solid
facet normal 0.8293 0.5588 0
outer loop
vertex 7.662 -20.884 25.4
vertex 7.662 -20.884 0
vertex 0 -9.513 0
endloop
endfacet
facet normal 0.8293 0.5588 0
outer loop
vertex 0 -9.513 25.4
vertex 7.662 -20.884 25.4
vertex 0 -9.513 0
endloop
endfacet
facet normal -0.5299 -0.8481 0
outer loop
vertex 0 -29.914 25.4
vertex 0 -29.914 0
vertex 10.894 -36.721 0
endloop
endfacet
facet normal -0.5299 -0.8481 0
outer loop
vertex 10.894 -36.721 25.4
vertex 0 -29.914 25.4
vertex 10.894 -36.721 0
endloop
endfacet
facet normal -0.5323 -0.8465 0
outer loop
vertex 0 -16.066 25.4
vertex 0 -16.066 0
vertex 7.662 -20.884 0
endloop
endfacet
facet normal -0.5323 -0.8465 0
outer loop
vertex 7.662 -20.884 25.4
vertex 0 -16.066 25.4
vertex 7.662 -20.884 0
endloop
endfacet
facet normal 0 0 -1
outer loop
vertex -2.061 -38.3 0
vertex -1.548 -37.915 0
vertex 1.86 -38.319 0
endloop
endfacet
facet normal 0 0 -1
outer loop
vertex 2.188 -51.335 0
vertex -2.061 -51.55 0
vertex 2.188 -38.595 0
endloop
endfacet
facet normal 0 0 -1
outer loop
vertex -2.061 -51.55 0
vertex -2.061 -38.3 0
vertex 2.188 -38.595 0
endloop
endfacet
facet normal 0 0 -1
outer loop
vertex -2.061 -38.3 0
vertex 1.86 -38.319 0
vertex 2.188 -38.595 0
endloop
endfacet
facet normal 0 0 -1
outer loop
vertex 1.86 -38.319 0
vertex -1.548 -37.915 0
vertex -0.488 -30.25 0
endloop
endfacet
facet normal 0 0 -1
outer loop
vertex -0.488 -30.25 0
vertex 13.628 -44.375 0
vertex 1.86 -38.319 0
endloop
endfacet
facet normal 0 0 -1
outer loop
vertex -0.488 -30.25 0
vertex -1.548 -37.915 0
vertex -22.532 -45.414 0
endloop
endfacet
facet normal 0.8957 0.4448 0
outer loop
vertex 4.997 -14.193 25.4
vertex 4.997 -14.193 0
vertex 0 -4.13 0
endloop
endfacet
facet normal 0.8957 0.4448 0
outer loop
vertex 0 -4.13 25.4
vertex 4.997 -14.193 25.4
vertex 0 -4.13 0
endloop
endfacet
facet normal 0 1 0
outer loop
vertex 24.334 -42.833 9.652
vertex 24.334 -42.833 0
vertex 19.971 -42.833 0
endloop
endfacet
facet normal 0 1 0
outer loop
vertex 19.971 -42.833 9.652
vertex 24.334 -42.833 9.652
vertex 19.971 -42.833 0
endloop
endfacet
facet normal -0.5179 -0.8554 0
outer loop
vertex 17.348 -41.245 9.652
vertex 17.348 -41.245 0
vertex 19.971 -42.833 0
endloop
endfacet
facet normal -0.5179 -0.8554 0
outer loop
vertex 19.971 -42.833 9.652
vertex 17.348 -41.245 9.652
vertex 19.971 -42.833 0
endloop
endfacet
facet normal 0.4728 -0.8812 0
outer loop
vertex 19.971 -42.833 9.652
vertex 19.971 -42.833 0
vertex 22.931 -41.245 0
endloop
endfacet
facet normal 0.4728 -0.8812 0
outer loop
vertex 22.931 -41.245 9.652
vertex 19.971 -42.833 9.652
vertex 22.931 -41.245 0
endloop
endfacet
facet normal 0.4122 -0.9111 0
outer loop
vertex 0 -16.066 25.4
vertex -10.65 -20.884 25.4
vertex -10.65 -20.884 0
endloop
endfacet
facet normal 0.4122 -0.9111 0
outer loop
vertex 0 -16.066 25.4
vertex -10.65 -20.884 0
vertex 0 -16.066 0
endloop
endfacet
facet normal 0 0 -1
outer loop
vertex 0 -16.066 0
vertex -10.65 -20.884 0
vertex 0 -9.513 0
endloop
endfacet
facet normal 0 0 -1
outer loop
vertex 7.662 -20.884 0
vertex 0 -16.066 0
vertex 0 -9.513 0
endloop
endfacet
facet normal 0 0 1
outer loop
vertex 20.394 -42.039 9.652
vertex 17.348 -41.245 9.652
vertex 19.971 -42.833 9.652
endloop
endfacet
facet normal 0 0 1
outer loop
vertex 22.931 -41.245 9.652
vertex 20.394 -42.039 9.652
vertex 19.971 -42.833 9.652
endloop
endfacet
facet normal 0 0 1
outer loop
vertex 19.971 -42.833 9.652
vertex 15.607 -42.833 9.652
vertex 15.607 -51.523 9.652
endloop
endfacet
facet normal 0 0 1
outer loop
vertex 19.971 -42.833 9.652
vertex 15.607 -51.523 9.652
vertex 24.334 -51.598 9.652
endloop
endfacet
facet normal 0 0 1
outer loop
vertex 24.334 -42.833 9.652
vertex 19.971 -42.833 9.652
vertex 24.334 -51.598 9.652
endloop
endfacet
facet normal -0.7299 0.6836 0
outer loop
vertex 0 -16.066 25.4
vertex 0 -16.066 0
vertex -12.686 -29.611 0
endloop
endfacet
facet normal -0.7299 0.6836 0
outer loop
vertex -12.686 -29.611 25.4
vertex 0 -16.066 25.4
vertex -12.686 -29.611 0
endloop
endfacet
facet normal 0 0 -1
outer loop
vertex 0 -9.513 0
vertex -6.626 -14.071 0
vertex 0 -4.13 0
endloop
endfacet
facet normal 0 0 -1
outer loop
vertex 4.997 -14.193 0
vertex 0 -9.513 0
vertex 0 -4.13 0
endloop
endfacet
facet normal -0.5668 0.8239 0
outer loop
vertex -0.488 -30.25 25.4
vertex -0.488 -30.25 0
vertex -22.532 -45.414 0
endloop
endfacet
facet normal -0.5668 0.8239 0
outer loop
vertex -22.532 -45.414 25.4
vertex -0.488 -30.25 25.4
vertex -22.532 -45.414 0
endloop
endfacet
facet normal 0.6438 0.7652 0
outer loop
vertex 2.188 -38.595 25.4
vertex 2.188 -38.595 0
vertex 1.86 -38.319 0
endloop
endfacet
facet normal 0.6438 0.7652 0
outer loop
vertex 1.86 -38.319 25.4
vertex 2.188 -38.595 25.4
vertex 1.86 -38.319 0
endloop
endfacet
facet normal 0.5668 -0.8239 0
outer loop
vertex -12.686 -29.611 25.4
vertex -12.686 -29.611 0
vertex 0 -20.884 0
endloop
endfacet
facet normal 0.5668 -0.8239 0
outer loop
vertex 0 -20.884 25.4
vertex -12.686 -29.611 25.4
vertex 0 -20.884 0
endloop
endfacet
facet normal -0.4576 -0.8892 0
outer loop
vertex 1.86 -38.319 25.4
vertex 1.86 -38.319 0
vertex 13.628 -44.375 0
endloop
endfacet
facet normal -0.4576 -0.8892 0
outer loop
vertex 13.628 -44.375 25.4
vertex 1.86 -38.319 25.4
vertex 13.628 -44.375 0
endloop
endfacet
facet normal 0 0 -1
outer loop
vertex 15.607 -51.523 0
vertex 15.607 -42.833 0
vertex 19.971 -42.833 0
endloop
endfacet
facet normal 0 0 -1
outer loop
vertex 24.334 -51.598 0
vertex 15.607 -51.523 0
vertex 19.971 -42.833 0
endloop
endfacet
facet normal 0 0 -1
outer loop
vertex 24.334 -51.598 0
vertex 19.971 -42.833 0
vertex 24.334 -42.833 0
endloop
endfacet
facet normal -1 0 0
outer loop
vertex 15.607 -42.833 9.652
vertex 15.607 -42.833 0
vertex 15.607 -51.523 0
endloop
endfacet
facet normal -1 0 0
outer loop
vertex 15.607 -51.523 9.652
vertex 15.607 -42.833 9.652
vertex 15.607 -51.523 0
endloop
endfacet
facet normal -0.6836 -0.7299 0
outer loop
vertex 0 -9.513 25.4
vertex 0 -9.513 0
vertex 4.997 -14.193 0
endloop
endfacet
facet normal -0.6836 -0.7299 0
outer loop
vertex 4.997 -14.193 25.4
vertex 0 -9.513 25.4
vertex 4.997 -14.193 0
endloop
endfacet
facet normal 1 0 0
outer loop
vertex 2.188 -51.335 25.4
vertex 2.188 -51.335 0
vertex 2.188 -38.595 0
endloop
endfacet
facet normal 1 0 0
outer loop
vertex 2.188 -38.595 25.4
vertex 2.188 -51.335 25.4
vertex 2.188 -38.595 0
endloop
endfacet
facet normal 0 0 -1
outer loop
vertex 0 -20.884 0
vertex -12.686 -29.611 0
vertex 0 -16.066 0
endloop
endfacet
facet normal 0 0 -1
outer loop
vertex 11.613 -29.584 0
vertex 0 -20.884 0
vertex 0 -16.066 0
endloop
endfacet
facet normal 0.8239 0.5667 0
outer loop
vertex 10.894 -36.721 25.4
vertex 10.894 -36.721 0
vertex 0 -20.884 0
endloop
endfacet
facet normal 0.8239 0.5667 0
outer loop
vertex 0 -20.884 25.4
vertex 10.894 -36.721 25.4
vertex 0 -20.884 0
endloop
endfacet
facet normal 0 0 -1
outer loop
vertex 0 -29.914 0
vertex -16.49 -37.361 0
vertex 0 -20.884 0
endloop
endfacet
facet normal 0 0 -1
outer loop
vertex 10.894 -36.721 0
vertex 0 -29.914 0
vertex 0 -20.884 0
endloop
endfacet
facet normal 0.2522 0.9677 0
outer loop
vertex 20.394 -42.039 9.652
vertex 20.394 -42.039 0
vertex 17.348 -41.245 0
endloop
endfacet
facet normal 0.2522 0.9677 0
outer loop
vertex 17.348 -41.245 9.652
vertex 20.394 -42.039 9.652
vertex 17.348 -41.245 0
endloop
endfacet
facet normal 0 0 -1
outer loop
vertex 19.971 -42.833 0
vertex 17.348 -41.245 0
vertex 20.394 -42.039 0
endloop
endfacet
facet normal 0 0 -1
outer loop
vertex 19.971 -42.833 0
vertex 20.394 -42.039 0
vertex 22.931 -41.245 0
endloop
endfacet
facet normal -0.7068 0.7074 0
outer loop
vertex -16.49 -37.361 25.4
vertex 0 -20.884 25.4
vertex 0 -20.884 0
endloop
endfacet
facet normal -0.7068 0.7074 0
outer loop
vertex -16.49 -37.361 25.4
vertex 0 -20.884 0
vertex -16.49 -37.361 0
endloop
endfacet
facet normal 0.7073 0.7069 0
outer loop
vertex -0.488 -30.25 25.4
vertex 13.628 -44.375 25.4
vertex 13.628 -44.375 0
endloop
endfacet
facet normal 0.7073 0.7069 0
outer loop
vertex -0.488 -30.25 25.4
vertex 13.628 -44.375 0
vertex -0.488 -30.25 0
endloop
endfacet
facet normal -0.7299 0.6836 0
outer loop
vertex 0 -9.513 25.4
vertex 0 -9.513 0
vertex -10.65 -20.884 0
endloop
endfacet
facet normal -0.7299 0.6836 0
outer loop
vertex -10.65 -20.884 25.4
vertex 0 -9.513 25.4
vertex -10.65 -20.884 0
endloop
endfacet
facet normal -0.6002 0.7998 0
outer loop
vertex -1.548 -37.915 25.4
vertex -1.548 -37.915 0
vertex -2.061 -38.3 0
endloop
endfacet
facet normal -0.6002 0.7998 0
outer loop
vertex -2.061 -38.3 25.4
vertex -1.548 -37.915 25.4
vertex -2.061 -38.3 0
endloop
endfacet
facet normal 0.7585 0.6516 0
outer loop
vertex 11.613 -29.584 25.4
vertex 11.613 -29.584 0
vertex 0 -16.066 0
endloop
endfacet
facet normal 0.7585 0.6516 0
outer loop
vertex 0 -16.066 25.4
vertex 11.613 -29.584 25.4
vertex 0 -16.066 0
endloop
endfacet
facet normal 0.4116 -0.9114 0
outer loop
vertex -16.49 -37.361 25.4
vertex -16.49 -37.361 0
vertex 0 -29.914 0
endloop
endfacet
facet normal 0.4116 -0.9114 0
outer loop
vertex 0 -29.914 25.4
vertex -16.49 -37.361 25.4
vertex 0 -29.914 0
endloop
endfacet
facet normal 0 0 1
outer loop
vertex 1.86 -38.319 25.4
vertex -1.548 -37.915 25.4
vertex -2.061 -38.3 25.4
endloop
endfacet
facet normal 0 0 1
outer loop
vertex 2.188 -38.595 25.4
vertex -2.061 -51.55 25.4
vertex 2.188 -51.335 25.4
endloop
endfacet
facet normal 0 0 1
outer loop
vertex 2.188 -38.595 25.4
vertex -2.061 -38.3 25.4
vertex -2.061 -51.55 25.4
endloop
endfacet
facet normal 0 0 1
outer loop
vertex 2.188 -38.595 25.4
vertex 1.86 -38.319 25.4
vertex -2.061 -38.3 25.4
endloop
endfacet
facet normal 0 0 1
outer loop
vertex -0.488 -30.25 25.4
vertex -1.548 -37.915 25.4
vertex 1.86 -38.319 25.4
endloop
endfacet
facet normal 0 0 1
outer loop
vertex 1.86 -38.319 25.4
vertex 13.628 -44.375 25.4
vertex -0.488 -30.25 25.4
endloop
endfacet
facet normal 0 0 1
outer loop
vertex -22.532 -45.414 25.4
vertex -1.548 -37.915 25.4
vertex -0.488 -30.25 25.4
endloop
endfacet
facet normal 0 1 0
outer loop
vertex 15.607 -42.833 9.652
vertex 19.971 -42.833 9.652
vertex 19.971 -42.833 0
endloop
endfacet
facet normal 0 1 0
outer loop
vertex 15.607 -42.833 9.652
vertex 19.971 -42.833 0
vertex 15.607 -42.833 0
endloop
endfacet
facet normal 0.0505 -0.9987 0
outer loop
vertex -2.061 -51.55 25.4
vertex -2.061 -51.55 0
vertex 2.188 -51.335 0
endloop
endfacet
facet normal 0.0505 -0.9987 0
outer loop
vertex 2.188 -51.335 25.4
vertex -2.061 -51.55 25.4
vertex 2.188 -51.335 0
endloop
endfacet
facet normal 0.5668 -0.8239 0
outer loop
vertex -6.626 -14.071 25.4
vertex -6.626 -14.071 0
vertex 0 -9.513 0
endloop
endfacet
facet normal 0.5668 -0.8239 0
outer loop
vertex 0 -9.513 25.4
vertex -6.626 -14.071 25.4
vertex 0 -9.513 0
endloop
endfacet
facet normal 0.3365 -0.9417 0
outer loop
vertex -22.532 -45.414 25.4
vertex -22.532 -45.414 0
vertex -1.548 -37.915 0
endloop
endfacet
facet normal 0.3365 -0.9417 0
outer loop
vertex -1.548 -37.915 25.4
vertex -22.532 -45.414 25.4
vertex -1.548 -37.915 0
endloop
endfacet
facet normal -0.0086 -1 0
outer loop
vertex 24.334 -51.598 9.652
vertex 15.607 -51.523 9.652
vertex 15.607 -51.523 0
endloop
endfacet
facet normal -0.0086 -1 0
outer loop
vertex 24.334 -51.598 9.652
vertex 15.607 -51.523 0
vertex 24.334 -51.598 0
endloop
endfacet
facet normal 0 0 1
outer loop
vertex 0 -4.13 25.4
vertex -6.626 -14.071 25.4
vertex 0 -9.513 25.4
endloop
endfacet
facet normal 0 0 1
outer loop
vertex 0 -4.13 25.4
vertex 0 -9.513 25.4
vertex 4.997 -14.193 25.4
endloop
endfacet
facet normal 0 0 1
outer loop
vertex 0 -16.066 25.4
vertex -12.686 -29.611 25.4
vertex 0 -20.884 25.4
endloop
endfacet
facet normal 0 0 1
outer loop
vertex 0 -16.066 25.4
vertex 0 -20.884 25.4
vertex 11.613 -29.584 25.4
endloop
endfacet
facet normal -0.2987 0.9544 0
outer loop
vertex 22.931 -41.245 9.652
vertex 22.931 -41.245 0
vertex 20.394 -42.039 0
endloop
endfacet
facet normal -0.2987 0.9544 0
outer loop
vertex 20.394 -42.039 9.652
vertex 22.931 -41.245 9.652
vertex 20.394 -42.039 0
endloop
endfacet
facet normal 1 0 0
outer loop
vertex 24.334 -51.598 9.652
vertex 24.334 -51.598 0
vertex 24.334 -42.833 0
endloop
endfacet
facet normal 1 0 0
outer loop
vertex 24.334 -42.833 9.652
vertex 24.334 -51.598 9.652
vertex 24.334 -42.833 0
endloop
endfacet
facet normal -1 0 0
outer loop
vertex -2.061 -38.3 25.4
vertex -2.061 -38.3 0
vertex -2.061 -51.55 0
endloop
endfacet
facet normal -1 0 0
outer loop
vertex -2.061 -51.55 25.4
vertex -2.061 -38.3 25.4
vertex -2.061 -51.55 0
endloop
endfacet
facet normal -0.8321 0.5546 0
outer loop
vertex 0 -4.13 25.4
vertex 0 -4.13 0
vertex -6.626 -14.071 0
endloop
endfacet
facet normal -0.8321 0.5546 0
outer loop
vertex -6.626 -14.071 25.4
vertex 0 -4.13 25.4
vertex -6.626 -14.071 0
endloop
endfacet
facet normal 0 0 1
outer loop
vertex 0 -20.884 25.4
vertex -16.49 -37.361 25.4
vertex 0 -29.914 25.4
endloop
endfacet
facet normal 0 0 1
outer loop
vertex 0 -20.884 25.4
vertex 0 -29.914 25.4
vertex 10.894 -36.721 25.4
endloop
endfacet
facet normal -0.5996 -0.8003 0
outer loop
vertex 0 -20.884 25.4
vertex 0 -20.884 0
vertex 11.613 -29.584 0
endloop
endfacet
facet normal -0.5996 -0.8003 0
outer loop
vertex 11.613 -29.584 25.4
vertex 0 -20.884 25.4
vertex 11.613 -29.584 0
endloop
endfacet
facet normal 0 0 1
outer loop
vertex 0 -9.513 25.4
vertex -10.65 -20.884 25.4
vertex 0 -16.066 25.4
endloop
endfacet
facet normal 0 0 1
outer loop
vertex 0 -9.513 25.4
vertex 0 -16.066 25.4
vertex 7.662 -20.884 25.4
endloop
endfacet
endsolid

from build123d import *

# Parameters (mm, degrees)
F1_DEPTH = 25.4
F3_DEPTH = 25.4
F5_DEPTH = 9.652


with BuildPart() as f1:
    # F0 (on Top) → F1 (new body)
    with BuildSketch(Plane.XY):
        Polygon((0, -16.065674), (-12.685884, -29.611059), (0, -20.884374), (11.613273, -29.583946), align=None)
        Polygon((-6.625512, -14.070917), (0, -9.513194), (4.996786, -14.192916), (0, -4.130037), align=None)
        Polygon((-10.64964, -20.884374), (0, -16.065674), (7.662494, -20.884374), (0, -9.513194), align=None)
        Polygon((13.627505, -44.375485), (-0.487541, -30.249636), (-22.532491, -45.41447), (0, -37.361499), align=None)
        Polygon((10.893873, -36.720677), (0, -20.884374), (-16.489735, -37.361499), (0, -29.914254), align=None)
    extrude(amount=F1_DEPTH)

    # F2 (on Top) → F3 (join)
    with BuildSketch(Plane.XY):
        Polygon((2.187551, -51.334936), (2.187551, -38.595065), (0, -36.750682), (-2.060871, -38.300365), (-2.060871, -51.549621), align=None)
    extrude(amount=F3_DEPTH)


with BuildPart() as f5:
    # F4 (on Top) → F5 (new body)
    with BuildSketch(Plane.XY):
        Polygon((17.348332, -41.244637), (19.970685, -42.83319), (22.930533, -41.244637), (20.393871, -42.038914), align=None)
        Polygon((15.607399, -42.83319), (15.607399, -51.522885), (24.333971, -51.598419), (24.333971, -42.83319), (19.970685, -42.83319), align=None)
    extrude(amount=F5_DEPTH)


solid = Compound([f1.part, f5.part])
